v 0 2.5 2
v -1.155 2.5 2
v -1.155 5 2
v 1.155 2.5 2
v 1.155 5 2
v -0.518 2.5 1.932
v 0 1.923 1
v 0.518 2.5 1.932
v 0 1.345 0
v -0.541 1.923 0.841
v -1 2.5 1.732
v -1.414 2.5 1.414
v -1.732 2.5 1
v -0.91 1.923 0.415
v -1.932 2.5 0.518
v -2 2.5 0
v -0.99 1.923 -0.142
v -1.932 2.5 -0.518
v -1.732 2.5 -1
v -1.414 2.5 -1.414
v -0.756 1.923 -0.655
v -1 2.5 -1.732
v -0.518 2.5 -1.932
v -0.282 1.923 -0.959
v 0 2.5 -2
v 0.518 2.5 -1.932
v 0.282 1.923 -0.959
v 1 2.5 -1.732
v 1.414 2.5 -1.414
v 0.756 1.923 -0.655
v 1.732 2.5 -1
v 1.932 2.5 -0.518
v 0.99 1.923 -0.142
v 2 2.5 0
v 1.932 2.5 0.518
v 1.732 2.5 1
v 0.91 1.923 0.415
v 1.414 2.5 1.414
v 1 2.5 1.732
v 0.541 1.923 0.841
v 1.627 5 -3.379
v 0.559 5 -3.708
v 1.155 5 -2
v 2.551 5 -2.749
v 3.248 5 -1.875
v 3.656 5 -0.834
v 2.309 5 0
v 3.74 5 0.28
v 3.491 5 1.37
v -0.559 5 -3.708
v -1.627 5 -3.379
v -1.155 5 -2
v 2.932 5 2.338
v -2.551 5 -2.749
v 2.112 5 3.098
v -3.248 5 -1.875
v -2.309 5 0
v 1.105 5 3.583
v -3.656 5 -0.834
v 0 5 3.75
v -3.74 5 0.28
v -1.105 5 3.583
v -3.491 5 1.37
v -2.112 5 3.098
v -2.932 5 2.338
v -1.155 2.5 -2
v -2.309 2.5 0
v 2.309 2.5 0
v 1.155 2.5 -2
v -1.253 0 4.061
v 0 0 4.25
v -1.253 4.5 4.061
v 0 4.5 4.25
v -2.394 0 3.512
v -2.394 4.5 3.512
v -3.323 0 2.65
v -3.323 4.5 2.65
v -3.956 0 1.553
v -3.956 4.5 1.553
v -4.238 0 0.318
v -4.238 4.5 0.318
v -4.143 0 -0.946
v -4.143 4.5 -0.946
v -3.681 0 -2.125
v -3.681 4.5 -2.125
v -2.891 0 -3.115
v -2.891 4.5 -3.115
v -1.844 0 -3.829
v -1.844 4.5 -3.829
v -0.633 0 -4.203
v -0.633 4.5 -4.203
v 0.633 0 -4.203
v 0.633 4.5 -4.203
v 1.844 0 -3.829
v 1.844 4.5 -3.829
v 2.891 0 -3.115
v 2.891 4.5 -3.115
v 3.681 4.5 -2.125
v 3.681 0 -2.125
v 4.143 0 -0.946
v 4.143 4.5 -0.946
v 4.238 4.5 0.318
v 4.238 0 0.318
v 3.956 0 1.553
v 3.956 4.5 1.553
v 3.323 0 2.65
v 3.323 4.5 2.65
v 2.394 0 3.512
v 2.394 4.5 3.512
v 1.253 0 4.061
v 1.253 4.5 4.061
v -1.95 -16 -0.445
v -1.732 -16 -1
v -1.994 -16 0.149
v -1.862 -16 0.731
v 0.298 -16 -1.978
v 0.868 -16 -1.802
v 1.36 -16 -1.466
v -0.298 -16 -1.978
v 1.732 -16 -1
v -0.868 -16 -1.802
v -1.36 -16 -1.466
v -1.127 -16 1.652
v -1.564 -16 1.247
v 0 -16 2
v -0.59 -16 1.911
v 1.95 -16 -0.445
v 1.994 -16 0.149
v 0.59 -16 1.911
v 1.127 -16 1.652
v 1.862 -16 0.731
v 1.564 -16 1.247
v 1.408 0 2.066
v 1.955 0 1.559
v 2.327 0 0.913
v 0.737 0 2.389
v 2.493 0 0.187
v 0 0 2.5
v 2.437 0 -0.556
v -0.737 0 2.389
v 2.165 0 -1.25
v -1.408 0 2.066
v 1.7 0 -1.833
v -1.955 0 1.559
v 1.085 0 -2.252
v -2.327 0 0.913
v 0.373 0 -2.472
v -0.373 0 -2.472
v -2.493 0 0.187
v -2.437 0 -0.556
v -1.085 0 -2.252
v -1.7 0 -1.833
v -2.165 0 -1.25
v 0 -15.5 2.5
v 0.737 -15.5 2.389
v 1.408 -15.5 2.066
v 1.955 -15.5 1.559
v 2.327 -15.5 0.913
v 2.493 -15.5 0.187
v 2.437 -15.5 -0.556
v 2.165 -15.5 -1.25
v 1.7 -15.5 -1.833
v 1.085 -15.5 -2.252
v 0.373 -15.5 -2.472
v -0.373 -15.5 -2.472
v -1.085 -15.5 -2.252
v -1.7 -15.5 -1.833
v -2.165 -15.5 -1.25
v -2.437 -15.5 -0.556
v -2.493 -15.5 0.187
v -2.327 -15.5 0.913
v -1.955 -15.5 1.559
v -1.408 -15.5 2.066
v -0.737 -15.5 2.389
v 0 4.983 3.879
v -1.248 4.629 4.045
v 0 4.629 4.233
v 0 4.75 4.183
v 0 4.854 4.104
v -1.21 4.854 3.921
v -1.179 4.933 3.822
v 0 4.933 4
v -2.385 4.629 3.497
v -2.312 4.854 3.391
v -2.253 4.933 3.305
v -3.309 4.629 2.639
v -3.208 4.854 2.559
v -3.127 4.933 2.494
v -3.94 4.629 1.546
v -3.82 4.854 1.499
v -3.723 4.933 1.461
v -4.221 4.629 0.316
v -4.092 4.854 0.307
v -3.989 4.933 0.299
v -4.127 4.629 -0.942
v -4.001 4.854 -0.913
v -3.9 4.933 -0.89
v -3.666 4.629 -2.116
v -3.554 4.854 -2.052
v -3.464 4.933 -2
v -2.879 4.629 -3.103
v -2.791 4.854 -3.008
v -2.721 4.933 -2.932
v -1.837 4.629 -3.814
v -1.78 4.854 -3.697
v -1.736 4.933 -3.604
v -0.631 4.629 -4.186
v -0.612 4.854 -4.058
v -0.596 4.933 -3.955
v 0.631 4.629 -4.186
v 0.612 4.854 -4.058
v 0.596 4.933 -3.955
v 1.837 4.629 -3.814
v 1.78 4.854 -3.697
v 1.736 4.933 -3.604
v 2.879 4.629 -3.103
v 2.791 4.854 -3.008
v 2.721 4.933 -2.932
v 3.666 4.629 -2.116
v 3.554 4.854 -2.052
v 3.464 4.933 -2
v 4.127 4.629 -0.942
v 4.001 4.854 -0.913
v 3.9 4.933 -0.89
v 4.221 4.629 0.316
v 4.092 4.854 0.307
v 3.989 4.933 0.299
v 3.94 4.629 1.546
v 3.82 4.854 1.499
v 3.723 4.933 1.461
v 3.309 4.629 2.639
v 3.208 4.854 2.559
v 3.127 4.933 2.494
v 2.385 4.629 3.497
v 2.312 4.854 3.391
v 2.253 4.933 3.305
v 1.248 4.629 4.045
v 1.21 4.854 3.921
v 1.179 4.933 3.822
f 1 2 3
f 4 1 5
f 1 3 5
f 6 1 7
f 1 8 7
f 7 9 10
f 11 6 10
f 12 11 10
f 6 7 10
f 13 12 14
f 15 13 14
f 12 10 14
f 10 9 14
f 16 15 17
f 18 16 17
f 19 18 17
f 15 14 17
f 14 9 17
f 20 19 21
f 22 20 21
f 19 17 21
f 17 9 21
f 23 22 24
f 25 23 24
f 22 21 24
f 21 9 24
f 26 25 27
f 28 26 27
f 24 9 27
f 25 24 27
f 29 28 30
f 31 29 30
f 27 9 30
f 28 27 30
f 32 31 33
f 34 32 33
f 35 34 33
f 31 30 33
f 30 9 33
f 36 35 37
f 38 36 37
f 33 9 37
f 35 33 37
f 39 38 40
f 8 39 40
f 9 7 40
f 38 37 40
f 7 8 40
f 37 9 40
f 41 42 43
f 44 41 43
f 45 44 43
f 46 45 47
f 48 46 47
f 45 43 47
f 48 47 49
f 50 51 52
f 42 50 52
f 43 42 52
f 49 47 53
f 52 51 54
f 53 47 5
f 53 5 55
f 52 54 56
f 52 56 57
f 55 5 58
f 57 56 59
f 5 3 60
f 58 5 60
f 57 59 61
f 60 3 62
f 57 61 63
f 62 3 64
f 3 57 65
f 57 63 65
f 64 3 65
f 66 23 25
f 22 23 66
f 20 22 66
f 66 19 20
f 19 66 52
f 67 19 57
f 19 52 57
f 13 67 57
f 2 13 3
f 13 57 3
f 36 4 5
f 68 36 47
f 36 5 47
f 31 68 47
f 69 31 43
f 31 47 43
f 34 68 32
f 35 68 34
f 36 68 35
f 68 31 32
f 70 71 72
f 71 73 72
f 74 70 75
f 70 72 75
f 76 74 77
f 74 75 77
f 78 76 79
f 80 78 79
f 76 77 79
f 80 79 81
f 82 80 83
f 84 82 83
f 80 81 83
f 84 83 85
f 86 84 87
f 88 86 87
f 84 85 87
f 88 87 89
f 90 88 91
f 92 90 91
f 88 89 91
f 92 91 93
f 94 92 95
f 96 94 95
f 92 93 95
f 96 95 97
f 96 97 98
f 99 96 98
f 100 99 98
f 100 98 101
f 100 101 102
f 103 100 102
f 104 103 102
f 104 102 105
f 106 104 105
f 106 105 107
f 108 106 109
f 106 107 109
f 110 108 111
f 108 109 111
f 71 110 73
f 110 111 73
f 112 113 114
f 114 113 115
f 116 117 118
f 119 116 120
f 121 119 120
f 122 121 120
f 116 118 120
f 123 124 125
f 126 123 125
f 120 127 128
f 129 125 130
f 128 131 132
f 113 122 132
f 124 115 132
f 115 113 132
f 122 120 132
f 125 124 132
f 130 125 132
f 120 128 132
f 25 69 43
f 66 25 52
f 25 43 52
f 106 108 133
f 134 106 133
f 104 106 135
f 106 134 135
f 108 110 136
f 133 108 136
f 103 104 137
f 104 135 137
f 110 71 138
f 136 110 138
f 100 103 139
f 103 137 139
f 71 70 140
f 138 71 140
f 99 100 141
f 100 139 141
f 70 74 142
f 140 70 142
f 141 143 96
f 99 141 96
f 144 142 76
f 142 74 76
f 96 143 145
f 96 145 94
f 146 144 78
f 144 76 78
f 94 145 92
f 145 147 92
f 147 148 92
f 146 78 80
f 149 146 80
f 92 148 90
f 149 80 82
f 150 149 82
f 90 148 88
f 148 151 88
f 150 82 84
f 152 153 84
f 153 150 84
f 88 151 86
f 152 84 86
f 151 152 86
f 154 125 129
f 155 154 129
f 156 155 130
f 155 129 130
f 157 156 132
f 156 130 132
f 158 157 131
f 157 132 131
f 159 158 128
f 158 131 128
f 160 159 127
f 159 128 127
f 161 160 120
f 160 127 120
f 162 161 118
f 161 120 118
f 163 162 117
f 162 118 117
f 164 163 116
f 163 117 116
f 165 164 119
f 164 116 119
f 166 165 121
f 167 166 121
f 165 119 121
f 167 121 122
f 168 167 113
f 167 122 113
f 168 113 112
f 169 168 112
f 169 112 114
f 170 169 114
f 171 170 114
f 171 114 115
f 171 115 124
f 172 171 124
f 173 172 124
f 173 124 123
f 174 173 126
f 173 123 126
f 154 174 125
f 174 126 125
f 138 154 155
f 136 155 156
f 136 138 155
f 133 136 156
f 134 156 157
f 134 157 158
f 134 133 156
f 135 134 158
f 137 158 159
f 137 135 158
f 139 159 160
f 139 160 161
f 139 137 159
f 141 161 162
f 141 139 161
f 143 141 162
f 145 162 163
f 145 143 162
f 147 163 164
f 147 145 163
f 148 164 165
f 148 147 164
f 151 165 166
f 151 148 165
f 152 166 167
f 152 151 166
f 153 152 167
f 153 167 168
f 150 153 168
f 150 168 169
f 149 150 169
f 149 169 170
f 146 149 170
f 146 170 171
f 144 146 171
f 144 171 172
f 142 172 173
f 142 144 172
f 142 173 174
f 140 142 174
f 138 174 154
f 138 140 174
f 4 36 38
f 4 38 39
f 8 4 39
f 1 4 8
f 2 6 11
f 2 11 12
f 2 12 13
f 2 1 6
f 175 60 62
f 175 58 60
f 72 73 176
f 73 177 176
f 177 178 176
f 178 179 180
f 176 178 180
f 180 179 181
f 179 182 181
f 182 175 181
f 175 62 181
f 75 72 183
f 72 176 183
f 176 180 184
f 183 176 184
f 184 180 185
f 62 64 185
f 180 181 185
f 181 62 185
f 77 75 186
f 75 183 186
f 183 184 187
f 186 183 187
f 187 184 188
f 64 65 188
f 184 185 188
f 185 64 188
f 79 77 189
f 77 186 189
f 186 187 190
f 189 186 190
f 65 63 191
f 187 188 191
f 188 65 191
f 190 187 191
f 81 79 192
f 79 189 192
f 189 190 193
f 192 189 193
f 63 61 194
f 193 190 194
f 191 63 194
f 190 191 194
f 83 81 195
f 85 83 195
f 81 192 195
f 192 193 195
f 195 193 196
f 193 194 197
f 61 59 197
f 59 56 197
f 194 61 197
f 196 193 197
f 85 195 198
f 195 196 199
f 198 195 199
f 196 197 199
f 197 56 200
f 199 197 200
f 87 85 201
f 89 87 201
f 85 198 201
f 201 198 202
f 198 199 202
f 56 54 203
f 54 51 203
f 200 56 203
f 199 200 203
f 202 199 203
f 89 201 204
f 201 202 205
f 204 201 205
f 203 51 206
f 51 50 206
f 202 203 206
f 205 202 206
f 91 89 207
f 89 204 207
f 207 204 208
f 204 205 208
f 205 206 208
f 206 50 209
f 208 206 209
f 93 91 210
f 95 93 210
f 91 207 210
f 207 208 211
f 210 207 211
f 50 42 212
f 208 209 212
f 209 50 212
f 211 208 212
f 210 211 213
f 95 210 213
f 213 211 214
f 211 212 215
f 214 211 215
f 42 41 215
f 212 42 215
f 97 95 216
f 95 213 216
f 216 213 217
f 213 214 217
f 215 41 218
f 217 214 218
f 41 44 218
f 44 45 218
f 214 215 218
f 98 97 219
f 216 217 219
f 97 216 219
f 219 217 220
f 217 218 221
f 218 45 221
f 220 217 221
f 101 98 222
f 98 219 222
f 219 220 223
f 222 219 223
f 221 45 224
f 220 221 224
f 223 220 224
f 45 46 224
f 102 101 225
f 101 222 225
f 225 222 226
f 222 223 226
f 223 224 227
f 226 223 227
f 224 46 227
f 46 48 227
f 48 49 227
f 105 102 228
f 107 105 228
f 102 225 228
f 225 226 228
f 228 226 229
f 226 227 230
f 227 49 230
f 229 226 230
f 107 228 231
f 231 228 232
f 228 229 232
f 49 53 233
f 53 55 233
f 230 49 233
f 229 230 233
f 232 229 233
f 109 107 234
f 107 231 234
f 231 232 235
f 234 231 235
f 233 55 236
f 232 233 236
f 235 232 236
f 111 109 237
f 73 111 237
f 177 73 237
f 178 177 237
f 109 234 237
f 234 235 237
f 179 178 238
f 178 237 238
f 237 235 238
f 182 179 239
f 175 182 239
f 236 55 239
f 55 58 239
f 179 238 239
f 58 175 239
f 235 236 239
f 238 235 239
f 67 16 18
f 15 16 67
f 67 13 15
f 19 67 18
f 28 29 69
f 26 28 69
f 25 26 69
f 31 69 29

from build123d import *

# Parameters (mm, degrees)
ESQUISSE2_R             = 2.5
BASE_EXTRUSION_DEPTH    = 16
CHANFREIN1_SIZE         = 0.5
ENL_V_MAT_EXTRU_1_DEPTH = 2.5


with BuildPart() as part:
    # Esquisse2 → Base-Extrusion (new body)
    with BuildSketch(Plane(origin=(0, 0, 0), x_dir=(1, 0, 0), z_dir=(0, 1, 0))):
        with Locations(Location((0, 0, 0), (0, 0, 270))):  # turned: the seam where the file's is
            Circle(ESQUISSE2_R)
    extrude(amount=-BASE_EXTRUSION_DEPTH)

    # Chanfrein1
    chanfrein1_edges = [part.edges().sort_by_distance(p)[0] for p in [
        (0, -16, -2.5),
    ]]
    chamfer(chanfrein1_edges, length=CHANFREIN1_SIZE)

    # Esquisse5 → Boss.-Révol.1 (revolve)
    with BuildSketch(Plane.XY, mode=Mode.PRIVATE) as boss_r_vol_1_sk:
        with BuildLine():
            Line((2, 5), (2, 2.5))
            Line((2, 2.5), (0, 1.345299462))
            Line((0, 1.345299462), (0, 0))
            Line((0, 0), (4.25, 0))
            Line((4.25, 0), (4.25, 4.5))
            ThreePointArc((4.25, 4.5), (4.103553391, 4.853553391), (3.75, 5))
            Line((3.75, 5), (2, 5))
        make_face()
    revolve(boss_r_vol_1_sk.sketch.rotate(Axis((0, 5, 0), (0, -1, 0)), 90), axis=Axis((0, 5, 0), (0, -1, 0)))  # turned: the seam where the file's is

    # Esquisse7 → Enlèv. mat.-Extru.1 (cut)
    with BuildSketch(Plane(origin=(0, 5, 0), x_dir=(-1, 0, 0), z_dir=(0, 1, 0))):
        Polygon((1.154700538, 2), (-1.154700538, 2), (-2.309401077, 0), (-1.154700538, -2), (1.154700538, -2), (2.309401077, 0), align=None)
    extrude(amount=-ENL_V_MAT_EXTRU_1_DEPTH, mode=Mode.SUBTRACT)


solid = part.part
